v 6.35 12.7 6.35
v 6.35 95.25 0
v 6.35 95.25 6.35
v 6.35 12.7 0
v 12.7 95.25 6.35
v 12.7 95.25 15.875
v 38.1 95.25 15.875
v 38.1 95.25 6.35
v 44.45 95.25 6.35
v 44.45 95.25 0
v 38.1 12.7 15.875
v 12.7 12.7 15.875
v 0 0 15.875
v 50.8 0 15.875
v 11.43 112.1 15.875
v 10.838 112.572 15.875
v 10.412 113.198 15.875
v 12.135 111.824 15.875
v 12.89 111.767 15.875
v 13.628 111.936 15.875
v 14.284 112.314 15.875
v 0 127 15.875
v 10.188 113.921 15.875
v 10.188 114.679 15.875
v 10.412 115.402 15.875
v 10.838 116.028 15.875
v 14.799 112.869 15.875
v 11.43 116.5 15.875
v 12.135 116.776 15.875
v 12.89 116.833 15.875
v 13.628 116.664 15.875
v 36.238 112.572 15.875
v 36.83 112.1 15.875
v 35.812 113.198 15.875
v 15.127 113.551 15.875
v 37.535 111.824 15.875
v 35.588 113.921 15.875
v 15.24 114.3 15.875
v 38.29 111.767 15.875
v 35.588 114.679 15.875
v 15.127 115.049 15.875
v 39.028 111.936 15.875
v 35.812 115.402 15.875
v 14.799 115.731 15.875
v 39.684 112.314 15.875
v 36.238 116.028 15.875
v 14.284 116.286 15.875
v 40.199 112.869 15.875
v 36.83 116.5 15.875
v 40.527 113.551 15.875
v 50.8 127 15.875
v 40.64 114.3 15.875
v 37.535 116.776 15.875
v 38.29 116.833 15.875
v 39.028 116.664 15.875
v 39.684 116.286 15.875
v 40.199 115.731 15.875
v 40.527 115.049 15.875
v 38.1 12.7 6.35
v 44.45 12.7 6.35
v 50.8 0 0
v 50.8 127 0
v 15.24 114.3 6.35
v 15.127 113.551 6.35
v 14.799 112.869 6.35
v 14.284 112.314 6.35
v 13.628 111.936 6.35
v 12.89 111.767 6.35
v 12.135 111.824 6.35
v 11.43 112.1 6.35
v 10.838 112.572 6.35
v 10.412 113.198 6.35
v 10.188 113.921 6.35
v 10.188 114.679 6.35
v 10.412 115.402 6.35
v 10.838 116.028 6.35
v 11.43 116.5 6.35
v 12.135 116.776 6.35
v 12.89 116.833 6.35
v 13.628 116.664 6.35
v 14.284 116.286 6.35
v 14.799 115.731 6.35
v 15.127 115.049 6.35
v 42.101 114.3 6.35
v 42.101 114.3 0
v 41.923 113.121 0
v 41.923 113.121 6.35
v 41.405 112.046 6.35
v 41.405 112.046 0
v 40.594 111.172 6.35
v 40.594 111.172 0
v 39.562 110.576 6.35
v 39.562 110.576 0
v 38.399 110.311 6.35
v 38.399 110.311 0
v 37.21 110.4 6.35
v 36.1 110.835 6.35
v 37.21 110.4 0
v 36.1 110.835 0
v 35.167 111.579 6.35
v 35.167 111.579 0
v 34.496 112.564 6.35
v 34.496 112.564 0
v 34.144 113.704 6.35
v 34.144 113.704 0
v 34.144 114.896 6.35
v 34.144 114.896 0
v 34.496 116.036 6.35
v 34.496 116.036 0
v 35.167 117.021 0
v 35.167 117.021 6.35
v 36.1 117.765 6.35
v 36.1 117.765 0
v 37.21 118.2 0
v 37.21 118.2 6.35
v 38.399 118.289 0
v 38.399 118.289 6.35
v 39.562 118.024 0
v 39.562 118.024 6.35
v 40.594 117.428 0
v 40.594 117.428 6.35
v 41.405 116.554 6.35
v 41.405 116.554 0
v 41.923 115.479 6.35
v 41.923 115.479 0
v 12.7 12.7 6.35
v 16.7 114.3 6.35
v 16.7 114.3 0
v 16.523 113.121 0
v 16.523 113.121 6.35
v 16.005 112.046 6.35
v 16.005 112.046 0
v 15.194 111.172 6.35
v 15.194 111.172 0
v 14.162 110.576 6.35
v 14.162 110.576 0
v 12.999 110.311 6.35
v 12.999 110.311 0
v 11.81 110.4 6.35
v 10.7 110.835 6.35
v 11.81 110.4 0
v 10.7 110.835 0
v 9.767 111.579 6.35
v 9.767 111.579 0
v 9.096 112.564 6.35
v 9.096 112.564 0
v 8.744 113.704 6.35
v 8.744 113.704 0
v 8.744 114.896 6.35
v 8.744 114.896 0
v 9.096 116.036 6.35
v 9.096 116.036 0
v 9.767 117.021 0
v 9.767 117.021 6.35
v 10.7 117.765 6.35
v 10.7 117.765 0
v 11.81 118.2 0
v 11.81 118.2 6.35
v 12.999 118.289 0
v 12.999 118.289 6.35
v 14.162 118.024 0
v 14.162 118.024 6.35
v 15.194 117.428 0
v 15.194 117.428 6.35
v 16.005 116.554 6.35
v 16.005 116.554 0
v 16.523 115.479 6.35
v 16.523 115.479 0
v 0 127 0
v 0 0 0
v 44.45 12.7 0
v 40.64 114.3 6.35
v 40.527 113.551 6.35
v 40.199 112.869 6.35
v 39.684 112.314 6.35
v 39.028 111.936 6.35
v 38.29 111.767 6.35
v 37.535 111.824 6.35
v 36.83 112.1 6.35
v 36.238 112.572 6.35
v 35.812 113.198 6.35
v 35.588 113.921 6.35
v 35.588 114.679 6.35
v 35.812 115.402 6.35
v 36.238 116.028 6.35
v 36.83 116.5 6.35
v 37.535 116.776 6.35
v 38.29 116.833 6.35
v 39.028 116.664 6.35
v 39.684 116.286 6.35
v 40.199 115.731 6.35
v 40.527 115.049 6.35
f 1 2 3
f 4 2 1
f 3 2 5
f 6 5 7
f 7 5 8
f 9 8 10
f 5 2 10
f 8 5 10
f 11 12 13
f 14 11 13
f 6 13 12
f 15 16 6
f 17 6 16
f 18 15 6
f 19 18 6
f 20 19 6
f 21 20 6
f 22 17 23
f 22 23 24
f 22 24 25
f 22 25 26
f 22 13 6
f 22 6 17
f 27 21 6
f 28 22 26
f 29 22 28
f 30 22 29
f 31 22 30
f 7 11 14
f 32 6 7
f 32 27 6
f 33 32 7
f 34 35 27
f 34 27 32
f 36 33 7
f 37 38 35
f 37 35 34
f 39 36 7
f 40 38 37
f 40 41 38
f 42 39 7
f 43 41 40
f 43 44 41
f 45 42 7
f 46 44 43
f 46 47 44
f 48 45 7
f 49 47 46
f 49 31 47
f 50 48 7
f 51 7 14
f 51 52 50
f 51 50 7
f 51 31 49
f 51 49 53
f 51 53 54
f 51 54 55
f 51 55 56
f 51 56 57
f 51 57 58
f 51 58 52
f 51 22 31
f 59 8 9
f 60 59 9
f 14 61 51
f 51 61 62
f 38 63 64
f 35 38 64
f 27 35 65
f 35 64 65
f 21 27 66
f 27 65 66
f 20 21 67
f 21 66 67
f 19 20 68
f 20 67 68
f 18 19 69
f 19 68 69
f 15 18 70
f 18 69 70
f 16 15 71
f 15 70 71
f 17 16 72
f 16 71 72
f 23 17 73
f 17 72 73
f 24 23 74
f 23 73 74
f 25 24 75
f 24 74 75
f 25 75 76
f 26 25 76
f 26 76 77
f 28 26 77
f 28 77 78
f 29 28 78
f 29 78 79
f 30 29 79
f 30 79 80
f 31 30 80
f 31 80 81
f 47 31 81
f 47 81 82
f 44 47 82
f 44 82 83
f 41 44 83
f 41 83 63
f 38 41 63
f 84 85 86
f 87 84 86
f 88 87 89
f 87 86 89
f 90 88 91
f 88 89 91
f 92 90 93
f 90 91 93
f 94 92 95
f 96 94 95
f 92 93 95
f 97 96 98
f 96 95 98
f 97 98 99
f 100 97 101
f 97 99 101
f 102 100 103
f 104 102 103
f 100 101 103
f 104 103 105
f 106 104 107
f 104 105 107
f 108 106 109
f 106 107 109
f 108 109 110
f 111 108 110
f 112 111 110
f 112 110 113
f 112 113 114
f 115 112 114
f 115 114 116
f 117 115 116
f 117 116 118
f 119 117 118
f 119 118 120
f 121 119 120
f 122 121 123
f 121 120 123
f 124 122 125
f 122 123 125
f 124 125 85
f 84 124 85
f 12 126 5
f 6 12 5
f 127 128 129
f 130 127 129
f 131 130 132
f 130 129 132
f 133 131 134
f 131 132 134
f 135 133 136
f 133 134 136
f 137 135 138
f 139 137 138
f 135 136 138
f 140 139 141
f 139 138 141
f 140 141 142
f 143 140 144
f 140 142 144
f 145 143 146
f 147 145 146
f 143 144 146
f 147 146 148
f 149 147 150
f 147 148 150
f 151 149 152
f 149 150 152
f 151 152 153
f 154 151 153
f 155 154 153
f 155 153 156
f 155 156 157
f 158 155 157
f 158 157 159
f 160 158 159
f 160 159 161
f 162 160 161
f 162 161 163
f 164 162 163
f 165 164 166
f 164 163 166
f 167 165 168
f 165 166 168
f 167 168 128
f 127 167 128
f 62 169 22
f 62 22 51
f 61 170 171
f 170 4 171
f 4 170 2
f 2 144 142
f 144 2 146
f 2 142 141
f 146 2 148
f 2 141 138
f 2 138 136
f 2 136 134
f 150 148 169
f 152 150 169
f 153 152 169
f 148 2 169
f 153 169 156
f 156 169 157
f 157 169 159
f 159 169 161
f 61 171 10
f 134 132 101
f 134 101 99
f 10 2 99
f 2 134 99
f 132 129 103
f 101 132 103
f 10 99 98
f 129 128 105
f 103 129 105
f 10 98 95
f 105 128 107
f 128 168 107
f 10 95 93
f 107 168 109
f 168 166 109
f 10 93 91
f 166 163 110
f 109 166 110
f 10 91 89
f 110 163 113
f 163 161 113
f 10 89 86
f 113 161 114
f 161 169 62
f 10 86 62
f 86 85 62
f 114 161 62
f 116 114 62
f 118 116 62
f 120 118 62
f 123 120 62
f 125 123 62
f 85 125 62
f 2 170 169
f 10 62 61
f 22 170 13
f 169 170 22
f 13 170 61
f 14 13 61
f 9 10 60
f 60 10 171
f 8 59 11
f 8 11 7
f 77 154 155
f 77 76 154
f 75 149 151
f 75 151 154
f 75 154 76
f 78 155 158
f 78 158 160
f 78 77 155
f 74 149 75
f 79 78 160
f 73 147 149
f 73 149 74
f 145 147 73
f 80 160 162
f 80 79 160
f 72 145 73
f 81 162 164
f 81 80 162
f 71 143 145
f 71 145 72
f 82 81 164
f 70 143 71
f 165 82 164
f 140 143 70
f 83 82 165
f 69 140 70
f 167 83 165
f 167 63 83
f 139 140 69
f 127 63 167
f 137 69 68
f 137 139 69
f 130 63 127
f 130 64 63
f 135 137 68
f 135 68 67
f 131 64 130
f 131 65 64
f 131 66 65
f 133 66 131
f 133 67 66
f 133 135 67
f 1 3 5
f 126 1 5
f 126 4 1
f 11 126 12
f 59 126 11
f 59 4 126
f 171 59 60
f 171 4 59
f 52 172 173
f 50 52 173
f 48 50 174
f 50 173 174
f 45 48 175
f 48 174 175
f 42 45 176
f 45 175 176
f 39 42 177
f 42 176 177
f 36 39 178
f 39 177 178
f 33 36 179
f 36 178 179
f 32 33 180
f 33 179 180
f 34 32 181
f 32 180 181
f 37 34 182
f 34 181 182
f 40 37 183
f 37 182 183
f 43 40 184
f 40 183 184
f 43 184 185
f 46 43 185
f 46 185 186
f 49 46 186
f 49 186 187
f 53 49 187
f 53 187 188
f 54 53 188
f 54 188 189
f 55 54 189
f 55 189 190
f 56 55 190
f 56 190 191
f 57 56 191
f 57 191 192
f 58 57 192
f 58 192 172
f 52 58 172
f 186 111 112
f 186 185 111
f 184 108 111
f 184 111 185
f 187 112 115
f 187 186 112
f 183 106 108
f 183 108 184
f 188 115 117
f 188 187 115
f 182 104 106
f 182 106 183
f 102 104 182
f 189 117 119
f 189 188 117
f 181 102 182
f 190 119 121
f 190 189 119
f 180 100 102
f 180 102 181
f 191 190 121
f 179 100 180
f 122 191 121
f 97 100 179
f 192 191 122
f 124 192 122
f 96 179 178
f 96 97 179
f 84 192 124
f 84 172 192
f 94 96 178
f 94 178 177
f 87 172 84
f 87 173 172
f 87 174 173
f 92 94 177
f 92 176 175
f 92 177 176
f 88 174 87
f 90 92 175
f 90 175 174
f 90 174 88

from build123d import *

# Parameters (mm, degrees)
F0_W     = 50.8
F0_H     = 127
F0_W_2   = 25.4
F0_H_2   = 82.55
F1_DEPTH = 15.875
F2_W     = 6.35
F2_H     = 82.55
F3_DEPTH = 6.35
F4_R     = 2.54
F5_DEPTH = 15.876
F4_R_2   = 4.0005
F6_DEPTH = 6.35


with BuildPart() as f1:
    # F0 (on Top) → F1 (new body)
    with BuildSketch(Plane.XY):
        with Locations((25.4, 63.5)):
            Rectangle(F0_W, F0_H)
        with Locations((25.4, 53.975)):
            Rectangle(F0_W_2, F0_H_2, mode=Mode.SUBTRACT)
    extrude(amount=F1_DEPTH)

    # F2 (on face) → F3 (cut)
    with BuildSketch(Plane(origin=(0, 0, 0), x_dir=(1, 0, 0), z_dir=(0, 0, -1))):
        with Locations((41.275, -53.975)):
            Rectangle(F2_W, F2_H)
        with Locations((9.525, -53.975)):
            Rectangle(F2_W, F2_H)
    extrude(amount=-F3_DEPTH, mode=Mode.SUBTRACT)

    # F4 (on face) → F5 (cut, through all)
    with BuildSketch(Plane(origin=(0, 0, 0), x_dir=(1, 0, 0), z_dir=(0, 0, -1))):
        with Locations((38.1, -114.3)):
            Circle(F4_R)
        with Locations((12.7, -114.3)):
            Circle(F4_R)
    extrude(amount=-F5_DEPTH, mode=Mode.SUBTRACT)

    # F4 (on face) → F6 (cut)
    with BuildSketch(Plane(origin=(0, 0, 0), x_dir=(1, 0, 0), z_dir=(0, 0, -1))):
        with Locations((38.1, -114.3)):
            Circle(F4_R_2)
        with Locations((38.1, -114.3)):
            Circle(F4_R, mode=Mode.SUBTRACT)
        with Locations((12.7, -114.3)):
            Circle(F4_R_2)
        with Locations((12.7, -114.3)):
            Circle(F4_R, mode=Mode.SUBTRACT)
    extrude(amount=-F6_DEPTH, mode=Mode.SUBTRACT)


solid = f1.part
